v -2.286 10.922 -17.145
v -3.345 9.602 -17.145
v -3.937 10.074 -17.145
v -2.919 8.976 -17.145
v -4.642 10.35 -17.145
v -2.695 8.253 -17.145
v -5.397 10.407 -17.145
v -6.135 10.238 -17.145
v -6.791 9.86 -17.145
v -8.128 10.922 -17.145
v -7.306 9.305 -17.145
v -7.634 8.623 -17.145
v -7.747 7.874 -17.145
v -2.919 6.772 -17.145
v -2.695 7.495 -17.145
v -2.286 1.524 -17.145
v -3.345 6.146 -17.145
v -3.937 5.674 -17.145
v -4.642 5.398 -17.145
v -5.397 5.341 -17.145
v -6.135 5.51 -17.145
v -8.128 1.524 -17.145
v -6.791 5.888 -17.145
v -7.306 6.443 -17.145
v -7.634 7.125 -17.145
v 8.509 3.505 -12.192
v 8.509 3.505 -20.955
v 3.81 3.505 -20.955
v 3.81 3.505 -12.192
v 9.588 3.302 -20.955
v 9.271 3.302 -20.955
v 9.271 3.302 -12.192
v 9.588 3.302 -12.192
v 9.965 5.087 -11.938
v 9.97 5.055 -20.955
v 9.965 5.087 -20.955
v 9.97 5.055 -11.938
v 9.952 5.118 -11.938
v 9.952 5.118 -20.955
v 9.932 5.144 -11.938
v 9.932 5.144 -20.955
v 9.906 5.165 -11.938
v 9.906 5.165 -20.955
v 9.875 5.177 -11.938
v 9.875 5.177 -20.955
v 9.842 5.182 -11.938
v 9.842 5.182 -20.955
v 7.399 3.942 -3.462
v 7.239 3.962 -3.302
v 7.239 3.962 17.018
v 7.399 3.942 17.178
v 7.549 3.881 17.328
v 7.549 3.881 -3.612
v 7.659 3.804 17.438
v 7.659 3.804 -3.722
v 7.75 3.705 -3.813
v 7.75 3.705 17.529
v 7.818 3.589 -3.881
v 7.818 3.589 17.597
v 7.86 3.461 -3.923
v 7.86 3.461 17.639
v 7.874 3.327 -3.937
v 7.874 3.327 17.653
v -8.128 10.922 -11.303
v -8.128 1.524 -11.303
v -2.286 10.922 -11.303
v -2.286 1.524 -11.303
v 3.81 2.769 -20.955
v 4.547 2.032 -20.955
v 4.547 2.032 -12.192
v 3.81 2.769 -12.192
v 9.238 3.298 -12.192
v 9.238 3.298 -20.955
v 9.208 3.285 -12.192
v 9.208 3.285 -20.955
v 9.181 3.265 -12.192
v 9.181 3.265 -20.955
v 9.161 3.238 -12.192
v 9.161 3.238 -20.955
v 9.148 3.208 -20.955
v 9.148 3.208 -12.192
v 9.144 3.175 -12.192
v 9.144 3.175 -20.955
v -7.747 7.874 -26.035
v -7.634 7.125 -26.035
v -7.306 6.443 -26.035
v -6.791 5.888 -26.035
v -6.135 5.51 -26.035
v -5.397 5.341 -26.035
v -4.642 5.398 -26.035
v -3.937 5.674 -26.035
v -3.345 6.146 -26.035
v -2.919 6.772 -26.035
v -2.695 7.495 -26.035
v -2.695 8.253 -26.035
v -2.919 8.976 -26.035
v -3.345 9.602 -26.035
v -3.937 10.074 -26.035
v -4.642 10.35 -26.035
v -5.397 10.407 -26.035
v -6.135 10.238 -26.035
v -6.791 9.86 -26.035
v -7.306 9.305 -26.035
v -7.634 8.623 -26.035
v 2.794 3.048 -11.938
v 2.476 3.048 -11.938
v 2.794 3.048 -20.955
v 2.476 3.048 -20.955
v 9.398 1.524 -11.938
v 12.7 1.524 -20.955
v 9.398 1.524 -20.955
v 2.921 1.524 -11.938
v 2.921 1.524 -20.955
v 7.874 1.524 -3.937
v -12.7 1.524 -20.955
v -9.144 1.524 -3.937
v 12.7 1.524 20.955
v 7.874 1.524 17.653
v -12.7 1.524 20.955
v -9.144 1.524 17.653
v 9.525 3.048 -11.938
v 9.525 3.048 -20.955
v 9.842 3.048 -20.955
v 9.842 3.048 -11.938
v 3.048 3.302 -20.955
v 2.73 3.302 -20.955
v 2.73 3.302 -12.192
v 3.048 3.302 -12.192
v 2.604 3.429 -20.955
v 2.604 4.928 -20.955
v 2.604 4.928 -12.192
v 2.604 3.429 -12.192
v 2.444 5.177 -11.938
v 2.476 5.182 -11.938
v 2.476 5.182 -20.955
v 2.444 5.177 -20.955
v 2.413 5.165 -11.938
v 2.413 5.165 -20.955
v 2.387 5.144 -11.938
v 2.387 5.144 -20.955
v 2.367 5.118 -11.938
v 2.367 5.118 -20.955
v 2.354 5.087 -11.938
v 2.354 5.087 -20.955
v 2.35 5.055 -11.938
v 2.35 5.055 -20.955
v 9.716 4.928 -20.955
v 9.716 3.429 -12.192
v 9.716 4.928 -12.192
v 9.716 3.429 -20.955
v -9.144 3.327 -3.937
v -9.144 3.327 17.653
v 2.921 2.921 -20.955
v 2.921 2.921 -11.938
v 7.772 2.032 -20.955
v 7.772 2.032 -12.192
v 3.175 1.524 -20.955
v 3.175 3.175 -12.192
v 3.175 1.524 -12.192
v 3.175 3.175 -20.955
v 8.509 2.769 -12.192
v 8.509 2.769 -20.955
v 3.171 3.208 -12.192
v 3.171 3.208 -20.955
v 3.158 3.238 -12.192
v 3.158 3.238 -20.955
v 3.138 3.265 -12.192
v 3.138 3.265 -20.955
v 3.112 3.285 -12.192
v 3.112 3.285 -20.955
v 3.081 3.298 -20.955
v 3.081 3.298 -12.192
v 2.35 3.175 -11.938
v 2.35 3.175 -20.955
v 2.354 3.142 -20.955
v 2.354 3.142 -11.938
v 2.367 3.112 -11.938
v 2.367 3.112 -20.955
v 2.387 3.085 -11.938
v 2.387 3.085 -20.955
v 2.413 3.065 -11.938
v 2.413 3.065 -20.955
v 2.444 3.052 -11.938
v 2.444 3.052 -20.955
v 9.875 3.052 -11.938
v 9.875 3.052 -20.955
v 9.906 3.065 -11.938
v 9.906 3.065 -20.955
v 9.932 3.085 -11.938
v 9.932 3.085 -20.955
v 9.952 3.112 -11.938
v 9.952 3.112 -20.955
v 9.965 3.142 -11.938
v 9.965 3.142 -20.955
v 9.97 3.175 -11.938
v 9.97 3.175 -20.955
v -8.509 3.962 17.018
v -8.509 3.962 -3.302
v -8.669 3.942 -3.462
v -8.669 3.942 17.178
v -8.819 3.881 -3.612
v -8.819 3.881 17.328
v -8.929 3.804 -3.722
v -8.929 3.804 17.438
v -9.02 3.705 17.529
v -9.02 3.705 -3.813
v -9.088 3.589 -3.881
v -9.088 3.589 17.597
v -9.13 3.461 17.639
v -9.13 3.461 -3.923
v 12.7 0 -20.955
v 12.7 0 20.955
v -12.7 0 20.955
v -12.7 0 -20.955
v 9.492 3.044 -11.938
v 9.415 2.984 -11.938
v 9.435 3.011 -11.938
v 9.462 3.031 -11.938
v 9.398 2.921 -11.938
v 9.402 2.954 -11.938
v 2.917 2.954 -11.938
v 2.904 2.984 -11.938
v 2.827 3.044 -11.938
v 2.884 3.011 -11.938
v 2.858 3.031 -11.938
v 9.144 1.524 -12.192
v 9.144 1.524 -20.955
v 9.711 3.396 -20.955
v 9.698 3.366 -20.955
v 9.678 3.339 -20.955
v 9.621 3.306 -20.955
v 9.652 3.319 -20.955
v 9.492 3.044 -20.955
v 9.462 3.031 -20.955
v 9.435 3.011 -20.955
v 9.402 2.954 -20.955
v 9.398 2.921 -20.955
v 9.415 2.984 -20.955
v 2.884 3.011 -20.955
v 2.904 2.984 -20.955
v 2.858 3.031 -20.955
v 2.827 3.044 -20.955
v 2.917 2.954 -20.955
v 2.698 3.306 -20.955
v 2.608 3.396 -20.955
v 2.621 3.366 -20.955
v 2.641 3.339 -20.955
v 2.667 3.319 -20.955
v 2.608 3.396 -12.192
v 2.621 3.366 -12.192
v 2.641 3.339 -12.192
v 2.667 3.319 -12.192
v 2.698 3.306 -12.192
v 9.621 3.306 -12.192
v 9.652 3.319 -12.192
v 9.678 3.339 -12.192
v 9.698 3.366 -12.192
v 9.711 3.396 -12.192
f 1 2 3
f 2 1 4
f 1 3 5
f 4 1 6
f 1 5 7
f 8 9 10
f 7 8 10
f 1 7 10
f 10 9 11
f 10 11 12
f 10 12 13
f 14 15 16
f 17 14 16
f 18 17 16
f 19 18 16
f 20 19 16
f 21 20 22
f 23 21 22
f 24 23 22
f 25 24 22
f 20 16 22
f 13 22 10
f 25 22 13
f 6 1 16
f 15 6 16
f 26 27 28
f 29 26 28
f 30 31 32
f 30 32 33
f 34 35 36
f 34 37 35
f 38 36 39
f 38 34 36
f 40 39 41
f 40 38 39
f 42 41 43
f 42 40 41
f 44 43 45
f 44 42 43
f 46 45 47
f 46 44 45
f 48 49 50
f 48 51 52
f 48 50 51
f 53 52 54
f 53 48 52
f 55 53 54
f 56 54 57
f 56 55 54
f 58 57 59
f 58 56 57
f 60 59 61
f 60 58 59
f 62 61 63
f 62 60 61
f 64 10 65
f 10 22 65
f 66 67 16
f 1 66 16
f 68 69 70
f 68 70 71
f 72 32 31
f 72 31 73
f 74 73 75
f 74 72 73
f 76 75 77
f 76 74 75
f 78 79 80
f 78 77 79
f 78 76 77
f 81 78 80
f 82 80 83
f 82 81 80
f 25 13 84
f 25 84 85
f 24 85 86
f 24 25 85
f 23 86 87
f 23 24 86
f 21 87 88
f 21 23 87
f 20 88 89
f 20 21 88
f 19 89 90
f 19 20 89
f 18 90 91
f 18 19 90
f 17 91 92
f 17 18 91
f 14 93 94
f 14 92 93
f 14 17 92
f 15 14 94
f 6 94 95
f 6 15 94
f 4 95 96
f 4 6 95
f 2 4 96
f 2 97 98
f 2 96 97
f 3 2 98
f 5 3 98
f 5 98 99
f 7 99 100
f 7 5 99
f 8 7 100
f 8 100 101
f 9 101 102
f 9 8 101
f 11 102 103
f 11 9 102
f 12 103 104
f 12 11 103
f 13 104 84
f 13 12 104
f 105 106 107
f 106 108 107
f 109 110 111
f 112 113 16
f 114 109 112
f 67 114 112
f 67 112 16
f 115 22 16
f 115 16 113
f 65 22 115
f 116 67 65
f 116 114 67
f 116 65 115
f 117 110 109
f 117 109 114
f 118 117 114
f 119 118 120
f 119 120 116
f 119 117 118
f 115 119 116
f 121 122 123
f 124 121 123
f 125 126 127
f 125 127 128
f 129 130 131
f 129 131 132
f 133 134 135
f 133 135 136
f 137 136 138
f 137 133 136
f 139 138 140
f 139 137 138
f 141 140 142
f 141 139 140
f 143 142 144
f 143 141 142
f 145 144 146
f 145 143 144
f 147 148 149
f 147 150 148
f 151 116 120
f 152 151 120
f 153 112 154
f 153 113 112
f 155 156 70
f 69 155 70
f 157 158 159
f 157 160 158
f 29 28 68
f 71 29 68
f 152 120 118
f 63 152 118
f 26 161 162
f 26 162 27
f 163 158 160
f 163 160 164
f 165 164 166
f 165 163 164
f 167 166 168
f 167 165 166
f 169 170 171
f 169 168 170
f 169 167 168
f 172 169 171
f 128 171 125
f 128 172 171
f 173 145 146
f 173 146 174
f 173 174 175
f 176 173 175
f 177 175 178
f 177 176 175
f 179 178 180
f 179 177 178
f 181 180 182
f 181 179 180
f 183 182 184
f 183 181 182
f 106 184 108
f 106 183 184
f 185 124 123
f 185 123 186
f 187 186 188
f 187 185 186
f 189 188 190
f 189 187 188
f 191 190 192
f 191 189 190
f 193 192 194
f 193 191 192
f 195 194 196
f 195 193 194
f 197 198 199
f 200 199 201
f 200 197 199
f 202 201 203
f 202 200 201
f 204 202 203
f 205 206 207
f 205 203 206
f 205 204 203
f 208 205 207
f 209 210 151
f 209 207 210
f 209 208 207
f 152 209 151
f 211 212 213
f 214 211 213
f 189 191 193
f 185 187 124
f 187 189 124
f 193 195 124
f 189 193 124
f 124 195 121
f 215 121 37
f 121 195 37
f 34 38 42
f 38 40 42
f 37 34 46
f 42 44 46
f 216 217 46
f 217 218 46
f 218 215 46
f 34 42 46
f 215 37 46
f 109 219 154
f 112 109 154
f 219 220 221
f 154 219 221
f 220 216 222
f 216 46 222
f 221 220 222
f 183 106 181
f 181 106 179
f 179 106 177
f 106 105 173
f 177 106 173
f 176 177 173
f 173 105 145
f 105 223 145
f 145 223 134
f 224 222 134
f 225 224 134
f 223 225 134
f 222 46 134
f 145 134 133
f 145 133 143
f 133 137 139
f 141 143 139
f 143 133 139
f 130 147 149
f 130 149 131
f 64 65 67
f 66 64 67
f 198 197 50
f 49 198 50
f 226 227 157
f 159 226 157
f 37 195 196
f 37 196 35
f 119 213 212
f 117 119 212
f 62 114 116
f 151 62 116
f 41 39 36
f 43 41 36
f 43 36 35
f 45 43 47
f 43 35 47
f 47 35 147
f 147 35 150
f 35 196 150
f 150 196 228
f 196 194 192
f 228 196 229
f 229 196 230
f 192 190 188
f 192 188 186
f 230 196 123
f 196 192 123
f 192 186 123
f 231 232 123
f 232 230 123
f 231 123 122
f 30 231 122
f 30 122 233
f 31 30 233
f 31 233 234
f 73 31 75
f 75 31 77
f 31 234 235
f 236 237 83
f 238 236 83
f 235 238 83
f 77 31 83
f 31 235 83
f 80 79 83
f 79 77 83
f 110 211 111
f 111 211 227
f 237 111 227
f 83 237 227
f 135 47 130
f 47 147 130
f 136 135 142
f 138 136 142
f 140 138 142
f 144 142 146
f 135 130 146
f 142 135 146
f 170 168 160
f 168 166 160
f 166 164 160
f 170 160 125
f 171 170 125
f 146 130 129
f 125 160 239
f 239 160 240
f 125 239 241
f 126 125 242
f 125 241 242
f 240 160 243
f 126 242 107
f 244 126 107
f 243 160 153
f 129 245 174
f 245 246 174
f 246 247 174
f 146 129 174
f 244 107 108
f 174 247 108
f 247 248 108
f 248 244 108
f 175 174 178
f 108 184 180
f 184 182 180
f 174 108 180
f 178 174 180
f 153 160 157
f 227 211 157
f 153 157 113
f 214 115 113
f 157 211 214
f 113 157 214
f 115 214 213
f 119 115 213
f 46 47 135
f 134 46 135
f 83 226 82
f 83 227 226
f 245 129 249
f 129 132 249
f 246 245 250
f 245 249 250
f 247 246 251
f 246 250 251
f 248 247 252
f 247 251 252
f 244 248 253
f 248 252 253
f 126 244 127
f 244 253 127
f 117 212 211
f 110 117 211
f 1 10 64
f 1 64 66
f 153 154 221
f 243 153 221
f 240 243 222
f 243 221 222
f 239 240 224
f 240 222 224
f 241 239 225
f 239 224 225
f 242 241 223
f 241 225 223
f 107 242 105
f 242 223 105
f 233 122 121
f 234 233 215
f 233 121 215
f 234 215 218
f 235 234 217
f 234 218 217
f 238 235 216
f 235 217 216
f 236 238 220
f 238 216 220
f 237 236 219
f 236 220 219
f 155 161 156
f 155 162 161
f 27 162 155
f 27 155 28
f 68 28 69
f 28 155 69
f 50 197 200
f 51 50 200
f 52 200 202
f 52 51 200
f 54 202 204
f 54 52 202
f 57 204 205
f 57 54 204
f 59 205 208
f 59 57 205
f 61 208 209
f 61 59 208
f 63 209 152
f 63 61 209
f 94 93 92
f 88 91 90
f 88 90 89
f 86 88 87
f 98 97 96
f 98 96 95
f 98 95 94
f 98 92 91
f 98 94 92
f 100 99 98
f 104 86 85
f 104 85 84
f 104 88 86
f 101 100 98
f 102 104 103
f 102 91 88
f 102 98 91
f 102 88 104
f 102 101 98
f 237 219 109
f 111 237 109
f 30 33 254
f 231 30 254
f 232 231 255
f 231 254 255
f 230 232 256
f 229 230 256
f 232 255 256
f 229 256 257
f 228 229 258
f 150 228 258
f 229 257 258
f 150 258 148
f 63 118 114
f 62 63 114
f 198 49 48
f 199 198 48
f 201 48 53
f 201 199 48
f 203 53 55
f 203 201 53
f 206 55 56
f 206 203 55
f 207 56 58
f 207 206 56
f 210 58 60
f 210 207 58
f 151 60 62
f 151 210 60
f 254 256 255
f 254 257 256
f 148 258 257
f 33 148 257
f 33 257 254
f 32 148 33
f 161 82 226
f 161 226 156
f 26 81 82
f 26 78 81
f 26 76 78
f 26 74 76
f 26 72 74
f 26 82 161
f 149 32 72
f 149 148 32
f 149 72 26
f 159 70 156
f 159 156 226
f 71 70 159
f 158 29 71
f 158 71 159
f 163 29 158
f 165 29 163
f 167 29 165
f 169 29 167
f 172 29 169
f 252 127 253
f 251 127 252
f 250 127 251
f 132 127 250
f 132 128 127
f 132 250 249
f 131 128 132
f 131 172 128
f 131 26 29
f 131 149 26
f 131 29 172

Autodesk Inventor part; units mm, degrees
ref_plane "YZ Plane" through (0, 0, 0) normal (1, 0, 0) x (0, 1, 0)
ref_plane "XZ Plane" through (0, 0, 0) normal (0, 1, 0) x (-1, 0, 0)
ref_plane "XY Plane" through (0, 0, 0) normal (0, 0, 1) x (1, 0, 0)
sketch "Sketch1" plane through (0, 0, 0) normal (0, 1, 0) x (-1, 0, 0)
  line L0 (12.7, 20.955) -> (-12.7, 20.955)
  line L1 (-12.7, 20.955) -> (-12.7, -20.955)
  line L2 (-12.7, -20.955) -> (12.7, -20.955)
  line L3 (12.7, -20.955) -> (12.7, 20.955)
  point P0 (0, 0)
  point P1 (12.7, 0)
  point P2 (0, -20.955)
  dimension "d0" = 41.91
  dimension "d1" = 25.4
extrude "Extrusion1" add sketch "Sketch1" along normal blind 1.524
sketch "Sketch2" plane through (0, 1.524, 0) normal (0, 1, 0) x (1, 0, 0)
  line L0 (-9.144, -17.653) -> (7.874, -17.653)
  line L1 (7.874, -17.653) -> (7.874, 3.937)
  line L2 (7.874, 3.937) -> (-9.144, 3.937)
  line L3 (-9.144, 3.937) -> (-9.144, -17.653)
  line L4 (12.7, -20.955) -> (12.7, 20.955) projected
  line L5 (-12.7, -20.955) -> (12.7, -20.955) projected
  point P0 (0, 0)
  dimension "d4" = 21.59
  dimension "d5" = 17.018
  dimension "d6" = 4.826
  dimension "d7" = 3.302
extrude "Extrusion2" add sketch "Sketch2" along normal blind 2.4384
fillet "Fillet1" radius 0.635 4 edges at (-0.635, 3.9624, 17.653) (7.874, 3.9624, 6.858) (-0.635, 3.9624, -3.937) (-9.144, 3.9624, 6.858)
sketch "Sketch3" plane through (0, 1.524, 0) normal (0, 1, 0) x (1, 0, 0)
  line L0 (-8.128, 11.303) -> (-2.286, 11.303)
  line L1 (-2.286, 11.303) -> (-2.286, 17.145)
  line L2 (-2.286, 17.145) -> (-8.128, 17.145)
  line L3 (-8.128, 17.145) -> (-8.128, 11.303)
  line L4 (-12.7, 20.955) -> (-12.7, -20.955) projected
  line L5 (12.7, 20.955) -> (-12.7, 20.955) projected
  point P0 (0, 0)
  dimension "d11" = 5.842
  dimension "d12" = 5.842
  dimension "d13" = 4.572
  dimension "d14" = 3.81
extrude "Extrusion3" add sketch "Sketch3" along normal blind 9.398
sketch "Sketch4" plane through (-2.286, 1.524, -17.145) normal (0, 0, -1) x (-1, 0, 0)
  circle A0 centre (2.921, 6.35) radius 2.54
  line L0 (0, 9.398) -> (5.842, 9.398) projected
  point P0 (-2.286, -1.524)
  point P1 (2.921, 9.398)
  dimension "d17" = 5.08
  dimension "d18" = 0.508
extrude "Extrusion4" add sketch "Sketch4" along normal blind 8.89
sketch "Sketch5" plane through (12.7, 0, -20.955) normal (0, 0, -1) x (-1, 0, 0)
  line L0 (0, 1.524) -> (25.4, 1.524) projected
  line L1 (3.302, 1.524) -> (9.779, 1.524)
  line L2 (9.779, 1.524) -> (9.779, 3.048)
  line L3 (3.302, 3.048) -> (3.302, 1.524)
  line L4 (2.7305, 3.048) -> (2.7305, 5.1816)
  line L5 (2.7305, 5.1816) -> (10.3505, 5.1816)
  line L6 (10.3505, 5.1816) -> (10.3505, 3.048)
  line L7 (10.3505, 3.048) -> (9.779, 3.048)
  line L8 (3.302, 3.048) -> (2.7305, 3.048)
  point P0 (12.7, 0)
  point P1 (10.0648, 3.048)
  point P2 (3.0162, 3.048)
  dimension "d21" = 3.6576
  dimension "d22" = 1.524
  dimension "d23" = 7.62
  dimension "d24" = 6.477
  dimension "d25" = 3.302
extrude "Extrusion5" add sketch "Sketch5" against normal blind 9.017
sketch "Sketch6" plane through (12.7, 0, -20.955) normal (0, 0, -1) x (-1, 0, 0)
  line L0 (0, 0) -> (25.4, 0) projected
  line L1 (25.4, 0) -> (25.4, 1.524) projected
  line L2 (9.779, 1.524) -> (25.4, 1.524) projected
  line L3 (9.779, 1.524) -> (9.779, 3.048) projected
  line L4 (9.779, 3.048) -> (10.3505, 3.048) projected
  line L5 (10.3505, 3.048) -> (10.3505, 5.1816) projected
  line L6 (10.3505, 5.1816) -> (2.7305, 5.1816) projected
  line L7 (2.7305, 5.1816) -> (2.7305, 3.048) projected
  line L8 (2.7305, 3.048) -> (3.302, 3.048) projected
  line L9 (3.302, 3.048) -> (3.302, 1.524) projected
  line L10 (0, 1.524) -> (3.302, 1.524) projected
  line L11 (0, 0) -> (0, 1.524) projected
  line L12 (2.9845, 4.9276) -> (10.0965, 4.9276)
  line L13 (10.0965, 4.9276) -> (10.0965, 3.302)
  line L14 (2.9845, 3.302) -> (2.9845, 4.9276)
  line L15 (3.302, 1.524) -> (9.779, 1.524) projected
  line L16 (9.525, 3.302) -> (9.525, 1.524)
  line L17 (9.525, 1.524) -> (3.556, 1.524)
  line L18 (3.556, 1.524) -> (3.556, 3.302)
  line L19 (10.0965, 3.302) -> (9.525, 3.302)
  line L20 (3.556, 3.302) -> (2.9845, 3.302)
  line L21 (4.191, 3.5052) -> (8.89, 3.5052)
  line L22 (8.89, 3.5052) -> (8.89, 2.7686)
  line L23 (8.89, 2.7686) -> (4.191, 2.7686)
  line L24 (4.191, 2.7686) -> (4.191, 3.5052)
  line L25 (4.191, 2.7686) -> (4.9276, 2.032)
  line L26 (4.191, 2.7686) -> (5.2327, 2.7686) construction
  line L27 (4.9276, 2.032) -> (8.1534, 2.032)
  line L28 (8.1534, 2.032) -> (8.89, 2.7686)
  line L29 (6.5405, 3.5052) -> (6.5405, 2.032) construction
  point P0 (12.7, 0)
  point P1 (6.5405, 2.7686)
  point P2 (6.5405, 2.7686)
  dimension "d28" = 0.254
  dimension "d29" = 0.254
  dimension "d30" = 0.254
  dimension "d32" = 0.254
  dimension "d33" = 0.254
  dimension "d34" = 0.254
  dimension "d35" = 0.254
  dimension "d36" = 45
  dimension "d37" = 0.635
  dimension "d38" = 0.635
  dimension "d39" = 0.508
  dimension "d40" = 1.4224
extrude "Extrusion6" cut sketch "Sketch6" against normal blind 8.763 contours L18 L20 L14 L12 L13 L19 L16 L15
fillet "Fillet2" radius 0.127 10 edges at (9.9695, 3.048, -16.4465) (9.398, 3.048, -16.4465) (9.7155, 3.302, -16.5735) (9.144, 3.302, -16.5735) (3.175, 3.302, -16.5735) (2.6035, 3.302, -16.5735) (2.3495, 3.048, -16.4465) (2.921, 3.048, -16.4465) (2.3495, 5.1816, -16.4465) (9.9695, 5.1816, -16.4465)
equation "\"d12\" = d11"
equation "\"d29\" = d28"
equation "\"d30\" = d28"
equation "\"d32\" = d28"
equation "\"d33\" = d28"
equation "\"d34\" = d28"
equation "\"d35\" = d28"
equation "\"d38\" = d37"
equation "\"d31\" = d28"
properties part number "GPS"
